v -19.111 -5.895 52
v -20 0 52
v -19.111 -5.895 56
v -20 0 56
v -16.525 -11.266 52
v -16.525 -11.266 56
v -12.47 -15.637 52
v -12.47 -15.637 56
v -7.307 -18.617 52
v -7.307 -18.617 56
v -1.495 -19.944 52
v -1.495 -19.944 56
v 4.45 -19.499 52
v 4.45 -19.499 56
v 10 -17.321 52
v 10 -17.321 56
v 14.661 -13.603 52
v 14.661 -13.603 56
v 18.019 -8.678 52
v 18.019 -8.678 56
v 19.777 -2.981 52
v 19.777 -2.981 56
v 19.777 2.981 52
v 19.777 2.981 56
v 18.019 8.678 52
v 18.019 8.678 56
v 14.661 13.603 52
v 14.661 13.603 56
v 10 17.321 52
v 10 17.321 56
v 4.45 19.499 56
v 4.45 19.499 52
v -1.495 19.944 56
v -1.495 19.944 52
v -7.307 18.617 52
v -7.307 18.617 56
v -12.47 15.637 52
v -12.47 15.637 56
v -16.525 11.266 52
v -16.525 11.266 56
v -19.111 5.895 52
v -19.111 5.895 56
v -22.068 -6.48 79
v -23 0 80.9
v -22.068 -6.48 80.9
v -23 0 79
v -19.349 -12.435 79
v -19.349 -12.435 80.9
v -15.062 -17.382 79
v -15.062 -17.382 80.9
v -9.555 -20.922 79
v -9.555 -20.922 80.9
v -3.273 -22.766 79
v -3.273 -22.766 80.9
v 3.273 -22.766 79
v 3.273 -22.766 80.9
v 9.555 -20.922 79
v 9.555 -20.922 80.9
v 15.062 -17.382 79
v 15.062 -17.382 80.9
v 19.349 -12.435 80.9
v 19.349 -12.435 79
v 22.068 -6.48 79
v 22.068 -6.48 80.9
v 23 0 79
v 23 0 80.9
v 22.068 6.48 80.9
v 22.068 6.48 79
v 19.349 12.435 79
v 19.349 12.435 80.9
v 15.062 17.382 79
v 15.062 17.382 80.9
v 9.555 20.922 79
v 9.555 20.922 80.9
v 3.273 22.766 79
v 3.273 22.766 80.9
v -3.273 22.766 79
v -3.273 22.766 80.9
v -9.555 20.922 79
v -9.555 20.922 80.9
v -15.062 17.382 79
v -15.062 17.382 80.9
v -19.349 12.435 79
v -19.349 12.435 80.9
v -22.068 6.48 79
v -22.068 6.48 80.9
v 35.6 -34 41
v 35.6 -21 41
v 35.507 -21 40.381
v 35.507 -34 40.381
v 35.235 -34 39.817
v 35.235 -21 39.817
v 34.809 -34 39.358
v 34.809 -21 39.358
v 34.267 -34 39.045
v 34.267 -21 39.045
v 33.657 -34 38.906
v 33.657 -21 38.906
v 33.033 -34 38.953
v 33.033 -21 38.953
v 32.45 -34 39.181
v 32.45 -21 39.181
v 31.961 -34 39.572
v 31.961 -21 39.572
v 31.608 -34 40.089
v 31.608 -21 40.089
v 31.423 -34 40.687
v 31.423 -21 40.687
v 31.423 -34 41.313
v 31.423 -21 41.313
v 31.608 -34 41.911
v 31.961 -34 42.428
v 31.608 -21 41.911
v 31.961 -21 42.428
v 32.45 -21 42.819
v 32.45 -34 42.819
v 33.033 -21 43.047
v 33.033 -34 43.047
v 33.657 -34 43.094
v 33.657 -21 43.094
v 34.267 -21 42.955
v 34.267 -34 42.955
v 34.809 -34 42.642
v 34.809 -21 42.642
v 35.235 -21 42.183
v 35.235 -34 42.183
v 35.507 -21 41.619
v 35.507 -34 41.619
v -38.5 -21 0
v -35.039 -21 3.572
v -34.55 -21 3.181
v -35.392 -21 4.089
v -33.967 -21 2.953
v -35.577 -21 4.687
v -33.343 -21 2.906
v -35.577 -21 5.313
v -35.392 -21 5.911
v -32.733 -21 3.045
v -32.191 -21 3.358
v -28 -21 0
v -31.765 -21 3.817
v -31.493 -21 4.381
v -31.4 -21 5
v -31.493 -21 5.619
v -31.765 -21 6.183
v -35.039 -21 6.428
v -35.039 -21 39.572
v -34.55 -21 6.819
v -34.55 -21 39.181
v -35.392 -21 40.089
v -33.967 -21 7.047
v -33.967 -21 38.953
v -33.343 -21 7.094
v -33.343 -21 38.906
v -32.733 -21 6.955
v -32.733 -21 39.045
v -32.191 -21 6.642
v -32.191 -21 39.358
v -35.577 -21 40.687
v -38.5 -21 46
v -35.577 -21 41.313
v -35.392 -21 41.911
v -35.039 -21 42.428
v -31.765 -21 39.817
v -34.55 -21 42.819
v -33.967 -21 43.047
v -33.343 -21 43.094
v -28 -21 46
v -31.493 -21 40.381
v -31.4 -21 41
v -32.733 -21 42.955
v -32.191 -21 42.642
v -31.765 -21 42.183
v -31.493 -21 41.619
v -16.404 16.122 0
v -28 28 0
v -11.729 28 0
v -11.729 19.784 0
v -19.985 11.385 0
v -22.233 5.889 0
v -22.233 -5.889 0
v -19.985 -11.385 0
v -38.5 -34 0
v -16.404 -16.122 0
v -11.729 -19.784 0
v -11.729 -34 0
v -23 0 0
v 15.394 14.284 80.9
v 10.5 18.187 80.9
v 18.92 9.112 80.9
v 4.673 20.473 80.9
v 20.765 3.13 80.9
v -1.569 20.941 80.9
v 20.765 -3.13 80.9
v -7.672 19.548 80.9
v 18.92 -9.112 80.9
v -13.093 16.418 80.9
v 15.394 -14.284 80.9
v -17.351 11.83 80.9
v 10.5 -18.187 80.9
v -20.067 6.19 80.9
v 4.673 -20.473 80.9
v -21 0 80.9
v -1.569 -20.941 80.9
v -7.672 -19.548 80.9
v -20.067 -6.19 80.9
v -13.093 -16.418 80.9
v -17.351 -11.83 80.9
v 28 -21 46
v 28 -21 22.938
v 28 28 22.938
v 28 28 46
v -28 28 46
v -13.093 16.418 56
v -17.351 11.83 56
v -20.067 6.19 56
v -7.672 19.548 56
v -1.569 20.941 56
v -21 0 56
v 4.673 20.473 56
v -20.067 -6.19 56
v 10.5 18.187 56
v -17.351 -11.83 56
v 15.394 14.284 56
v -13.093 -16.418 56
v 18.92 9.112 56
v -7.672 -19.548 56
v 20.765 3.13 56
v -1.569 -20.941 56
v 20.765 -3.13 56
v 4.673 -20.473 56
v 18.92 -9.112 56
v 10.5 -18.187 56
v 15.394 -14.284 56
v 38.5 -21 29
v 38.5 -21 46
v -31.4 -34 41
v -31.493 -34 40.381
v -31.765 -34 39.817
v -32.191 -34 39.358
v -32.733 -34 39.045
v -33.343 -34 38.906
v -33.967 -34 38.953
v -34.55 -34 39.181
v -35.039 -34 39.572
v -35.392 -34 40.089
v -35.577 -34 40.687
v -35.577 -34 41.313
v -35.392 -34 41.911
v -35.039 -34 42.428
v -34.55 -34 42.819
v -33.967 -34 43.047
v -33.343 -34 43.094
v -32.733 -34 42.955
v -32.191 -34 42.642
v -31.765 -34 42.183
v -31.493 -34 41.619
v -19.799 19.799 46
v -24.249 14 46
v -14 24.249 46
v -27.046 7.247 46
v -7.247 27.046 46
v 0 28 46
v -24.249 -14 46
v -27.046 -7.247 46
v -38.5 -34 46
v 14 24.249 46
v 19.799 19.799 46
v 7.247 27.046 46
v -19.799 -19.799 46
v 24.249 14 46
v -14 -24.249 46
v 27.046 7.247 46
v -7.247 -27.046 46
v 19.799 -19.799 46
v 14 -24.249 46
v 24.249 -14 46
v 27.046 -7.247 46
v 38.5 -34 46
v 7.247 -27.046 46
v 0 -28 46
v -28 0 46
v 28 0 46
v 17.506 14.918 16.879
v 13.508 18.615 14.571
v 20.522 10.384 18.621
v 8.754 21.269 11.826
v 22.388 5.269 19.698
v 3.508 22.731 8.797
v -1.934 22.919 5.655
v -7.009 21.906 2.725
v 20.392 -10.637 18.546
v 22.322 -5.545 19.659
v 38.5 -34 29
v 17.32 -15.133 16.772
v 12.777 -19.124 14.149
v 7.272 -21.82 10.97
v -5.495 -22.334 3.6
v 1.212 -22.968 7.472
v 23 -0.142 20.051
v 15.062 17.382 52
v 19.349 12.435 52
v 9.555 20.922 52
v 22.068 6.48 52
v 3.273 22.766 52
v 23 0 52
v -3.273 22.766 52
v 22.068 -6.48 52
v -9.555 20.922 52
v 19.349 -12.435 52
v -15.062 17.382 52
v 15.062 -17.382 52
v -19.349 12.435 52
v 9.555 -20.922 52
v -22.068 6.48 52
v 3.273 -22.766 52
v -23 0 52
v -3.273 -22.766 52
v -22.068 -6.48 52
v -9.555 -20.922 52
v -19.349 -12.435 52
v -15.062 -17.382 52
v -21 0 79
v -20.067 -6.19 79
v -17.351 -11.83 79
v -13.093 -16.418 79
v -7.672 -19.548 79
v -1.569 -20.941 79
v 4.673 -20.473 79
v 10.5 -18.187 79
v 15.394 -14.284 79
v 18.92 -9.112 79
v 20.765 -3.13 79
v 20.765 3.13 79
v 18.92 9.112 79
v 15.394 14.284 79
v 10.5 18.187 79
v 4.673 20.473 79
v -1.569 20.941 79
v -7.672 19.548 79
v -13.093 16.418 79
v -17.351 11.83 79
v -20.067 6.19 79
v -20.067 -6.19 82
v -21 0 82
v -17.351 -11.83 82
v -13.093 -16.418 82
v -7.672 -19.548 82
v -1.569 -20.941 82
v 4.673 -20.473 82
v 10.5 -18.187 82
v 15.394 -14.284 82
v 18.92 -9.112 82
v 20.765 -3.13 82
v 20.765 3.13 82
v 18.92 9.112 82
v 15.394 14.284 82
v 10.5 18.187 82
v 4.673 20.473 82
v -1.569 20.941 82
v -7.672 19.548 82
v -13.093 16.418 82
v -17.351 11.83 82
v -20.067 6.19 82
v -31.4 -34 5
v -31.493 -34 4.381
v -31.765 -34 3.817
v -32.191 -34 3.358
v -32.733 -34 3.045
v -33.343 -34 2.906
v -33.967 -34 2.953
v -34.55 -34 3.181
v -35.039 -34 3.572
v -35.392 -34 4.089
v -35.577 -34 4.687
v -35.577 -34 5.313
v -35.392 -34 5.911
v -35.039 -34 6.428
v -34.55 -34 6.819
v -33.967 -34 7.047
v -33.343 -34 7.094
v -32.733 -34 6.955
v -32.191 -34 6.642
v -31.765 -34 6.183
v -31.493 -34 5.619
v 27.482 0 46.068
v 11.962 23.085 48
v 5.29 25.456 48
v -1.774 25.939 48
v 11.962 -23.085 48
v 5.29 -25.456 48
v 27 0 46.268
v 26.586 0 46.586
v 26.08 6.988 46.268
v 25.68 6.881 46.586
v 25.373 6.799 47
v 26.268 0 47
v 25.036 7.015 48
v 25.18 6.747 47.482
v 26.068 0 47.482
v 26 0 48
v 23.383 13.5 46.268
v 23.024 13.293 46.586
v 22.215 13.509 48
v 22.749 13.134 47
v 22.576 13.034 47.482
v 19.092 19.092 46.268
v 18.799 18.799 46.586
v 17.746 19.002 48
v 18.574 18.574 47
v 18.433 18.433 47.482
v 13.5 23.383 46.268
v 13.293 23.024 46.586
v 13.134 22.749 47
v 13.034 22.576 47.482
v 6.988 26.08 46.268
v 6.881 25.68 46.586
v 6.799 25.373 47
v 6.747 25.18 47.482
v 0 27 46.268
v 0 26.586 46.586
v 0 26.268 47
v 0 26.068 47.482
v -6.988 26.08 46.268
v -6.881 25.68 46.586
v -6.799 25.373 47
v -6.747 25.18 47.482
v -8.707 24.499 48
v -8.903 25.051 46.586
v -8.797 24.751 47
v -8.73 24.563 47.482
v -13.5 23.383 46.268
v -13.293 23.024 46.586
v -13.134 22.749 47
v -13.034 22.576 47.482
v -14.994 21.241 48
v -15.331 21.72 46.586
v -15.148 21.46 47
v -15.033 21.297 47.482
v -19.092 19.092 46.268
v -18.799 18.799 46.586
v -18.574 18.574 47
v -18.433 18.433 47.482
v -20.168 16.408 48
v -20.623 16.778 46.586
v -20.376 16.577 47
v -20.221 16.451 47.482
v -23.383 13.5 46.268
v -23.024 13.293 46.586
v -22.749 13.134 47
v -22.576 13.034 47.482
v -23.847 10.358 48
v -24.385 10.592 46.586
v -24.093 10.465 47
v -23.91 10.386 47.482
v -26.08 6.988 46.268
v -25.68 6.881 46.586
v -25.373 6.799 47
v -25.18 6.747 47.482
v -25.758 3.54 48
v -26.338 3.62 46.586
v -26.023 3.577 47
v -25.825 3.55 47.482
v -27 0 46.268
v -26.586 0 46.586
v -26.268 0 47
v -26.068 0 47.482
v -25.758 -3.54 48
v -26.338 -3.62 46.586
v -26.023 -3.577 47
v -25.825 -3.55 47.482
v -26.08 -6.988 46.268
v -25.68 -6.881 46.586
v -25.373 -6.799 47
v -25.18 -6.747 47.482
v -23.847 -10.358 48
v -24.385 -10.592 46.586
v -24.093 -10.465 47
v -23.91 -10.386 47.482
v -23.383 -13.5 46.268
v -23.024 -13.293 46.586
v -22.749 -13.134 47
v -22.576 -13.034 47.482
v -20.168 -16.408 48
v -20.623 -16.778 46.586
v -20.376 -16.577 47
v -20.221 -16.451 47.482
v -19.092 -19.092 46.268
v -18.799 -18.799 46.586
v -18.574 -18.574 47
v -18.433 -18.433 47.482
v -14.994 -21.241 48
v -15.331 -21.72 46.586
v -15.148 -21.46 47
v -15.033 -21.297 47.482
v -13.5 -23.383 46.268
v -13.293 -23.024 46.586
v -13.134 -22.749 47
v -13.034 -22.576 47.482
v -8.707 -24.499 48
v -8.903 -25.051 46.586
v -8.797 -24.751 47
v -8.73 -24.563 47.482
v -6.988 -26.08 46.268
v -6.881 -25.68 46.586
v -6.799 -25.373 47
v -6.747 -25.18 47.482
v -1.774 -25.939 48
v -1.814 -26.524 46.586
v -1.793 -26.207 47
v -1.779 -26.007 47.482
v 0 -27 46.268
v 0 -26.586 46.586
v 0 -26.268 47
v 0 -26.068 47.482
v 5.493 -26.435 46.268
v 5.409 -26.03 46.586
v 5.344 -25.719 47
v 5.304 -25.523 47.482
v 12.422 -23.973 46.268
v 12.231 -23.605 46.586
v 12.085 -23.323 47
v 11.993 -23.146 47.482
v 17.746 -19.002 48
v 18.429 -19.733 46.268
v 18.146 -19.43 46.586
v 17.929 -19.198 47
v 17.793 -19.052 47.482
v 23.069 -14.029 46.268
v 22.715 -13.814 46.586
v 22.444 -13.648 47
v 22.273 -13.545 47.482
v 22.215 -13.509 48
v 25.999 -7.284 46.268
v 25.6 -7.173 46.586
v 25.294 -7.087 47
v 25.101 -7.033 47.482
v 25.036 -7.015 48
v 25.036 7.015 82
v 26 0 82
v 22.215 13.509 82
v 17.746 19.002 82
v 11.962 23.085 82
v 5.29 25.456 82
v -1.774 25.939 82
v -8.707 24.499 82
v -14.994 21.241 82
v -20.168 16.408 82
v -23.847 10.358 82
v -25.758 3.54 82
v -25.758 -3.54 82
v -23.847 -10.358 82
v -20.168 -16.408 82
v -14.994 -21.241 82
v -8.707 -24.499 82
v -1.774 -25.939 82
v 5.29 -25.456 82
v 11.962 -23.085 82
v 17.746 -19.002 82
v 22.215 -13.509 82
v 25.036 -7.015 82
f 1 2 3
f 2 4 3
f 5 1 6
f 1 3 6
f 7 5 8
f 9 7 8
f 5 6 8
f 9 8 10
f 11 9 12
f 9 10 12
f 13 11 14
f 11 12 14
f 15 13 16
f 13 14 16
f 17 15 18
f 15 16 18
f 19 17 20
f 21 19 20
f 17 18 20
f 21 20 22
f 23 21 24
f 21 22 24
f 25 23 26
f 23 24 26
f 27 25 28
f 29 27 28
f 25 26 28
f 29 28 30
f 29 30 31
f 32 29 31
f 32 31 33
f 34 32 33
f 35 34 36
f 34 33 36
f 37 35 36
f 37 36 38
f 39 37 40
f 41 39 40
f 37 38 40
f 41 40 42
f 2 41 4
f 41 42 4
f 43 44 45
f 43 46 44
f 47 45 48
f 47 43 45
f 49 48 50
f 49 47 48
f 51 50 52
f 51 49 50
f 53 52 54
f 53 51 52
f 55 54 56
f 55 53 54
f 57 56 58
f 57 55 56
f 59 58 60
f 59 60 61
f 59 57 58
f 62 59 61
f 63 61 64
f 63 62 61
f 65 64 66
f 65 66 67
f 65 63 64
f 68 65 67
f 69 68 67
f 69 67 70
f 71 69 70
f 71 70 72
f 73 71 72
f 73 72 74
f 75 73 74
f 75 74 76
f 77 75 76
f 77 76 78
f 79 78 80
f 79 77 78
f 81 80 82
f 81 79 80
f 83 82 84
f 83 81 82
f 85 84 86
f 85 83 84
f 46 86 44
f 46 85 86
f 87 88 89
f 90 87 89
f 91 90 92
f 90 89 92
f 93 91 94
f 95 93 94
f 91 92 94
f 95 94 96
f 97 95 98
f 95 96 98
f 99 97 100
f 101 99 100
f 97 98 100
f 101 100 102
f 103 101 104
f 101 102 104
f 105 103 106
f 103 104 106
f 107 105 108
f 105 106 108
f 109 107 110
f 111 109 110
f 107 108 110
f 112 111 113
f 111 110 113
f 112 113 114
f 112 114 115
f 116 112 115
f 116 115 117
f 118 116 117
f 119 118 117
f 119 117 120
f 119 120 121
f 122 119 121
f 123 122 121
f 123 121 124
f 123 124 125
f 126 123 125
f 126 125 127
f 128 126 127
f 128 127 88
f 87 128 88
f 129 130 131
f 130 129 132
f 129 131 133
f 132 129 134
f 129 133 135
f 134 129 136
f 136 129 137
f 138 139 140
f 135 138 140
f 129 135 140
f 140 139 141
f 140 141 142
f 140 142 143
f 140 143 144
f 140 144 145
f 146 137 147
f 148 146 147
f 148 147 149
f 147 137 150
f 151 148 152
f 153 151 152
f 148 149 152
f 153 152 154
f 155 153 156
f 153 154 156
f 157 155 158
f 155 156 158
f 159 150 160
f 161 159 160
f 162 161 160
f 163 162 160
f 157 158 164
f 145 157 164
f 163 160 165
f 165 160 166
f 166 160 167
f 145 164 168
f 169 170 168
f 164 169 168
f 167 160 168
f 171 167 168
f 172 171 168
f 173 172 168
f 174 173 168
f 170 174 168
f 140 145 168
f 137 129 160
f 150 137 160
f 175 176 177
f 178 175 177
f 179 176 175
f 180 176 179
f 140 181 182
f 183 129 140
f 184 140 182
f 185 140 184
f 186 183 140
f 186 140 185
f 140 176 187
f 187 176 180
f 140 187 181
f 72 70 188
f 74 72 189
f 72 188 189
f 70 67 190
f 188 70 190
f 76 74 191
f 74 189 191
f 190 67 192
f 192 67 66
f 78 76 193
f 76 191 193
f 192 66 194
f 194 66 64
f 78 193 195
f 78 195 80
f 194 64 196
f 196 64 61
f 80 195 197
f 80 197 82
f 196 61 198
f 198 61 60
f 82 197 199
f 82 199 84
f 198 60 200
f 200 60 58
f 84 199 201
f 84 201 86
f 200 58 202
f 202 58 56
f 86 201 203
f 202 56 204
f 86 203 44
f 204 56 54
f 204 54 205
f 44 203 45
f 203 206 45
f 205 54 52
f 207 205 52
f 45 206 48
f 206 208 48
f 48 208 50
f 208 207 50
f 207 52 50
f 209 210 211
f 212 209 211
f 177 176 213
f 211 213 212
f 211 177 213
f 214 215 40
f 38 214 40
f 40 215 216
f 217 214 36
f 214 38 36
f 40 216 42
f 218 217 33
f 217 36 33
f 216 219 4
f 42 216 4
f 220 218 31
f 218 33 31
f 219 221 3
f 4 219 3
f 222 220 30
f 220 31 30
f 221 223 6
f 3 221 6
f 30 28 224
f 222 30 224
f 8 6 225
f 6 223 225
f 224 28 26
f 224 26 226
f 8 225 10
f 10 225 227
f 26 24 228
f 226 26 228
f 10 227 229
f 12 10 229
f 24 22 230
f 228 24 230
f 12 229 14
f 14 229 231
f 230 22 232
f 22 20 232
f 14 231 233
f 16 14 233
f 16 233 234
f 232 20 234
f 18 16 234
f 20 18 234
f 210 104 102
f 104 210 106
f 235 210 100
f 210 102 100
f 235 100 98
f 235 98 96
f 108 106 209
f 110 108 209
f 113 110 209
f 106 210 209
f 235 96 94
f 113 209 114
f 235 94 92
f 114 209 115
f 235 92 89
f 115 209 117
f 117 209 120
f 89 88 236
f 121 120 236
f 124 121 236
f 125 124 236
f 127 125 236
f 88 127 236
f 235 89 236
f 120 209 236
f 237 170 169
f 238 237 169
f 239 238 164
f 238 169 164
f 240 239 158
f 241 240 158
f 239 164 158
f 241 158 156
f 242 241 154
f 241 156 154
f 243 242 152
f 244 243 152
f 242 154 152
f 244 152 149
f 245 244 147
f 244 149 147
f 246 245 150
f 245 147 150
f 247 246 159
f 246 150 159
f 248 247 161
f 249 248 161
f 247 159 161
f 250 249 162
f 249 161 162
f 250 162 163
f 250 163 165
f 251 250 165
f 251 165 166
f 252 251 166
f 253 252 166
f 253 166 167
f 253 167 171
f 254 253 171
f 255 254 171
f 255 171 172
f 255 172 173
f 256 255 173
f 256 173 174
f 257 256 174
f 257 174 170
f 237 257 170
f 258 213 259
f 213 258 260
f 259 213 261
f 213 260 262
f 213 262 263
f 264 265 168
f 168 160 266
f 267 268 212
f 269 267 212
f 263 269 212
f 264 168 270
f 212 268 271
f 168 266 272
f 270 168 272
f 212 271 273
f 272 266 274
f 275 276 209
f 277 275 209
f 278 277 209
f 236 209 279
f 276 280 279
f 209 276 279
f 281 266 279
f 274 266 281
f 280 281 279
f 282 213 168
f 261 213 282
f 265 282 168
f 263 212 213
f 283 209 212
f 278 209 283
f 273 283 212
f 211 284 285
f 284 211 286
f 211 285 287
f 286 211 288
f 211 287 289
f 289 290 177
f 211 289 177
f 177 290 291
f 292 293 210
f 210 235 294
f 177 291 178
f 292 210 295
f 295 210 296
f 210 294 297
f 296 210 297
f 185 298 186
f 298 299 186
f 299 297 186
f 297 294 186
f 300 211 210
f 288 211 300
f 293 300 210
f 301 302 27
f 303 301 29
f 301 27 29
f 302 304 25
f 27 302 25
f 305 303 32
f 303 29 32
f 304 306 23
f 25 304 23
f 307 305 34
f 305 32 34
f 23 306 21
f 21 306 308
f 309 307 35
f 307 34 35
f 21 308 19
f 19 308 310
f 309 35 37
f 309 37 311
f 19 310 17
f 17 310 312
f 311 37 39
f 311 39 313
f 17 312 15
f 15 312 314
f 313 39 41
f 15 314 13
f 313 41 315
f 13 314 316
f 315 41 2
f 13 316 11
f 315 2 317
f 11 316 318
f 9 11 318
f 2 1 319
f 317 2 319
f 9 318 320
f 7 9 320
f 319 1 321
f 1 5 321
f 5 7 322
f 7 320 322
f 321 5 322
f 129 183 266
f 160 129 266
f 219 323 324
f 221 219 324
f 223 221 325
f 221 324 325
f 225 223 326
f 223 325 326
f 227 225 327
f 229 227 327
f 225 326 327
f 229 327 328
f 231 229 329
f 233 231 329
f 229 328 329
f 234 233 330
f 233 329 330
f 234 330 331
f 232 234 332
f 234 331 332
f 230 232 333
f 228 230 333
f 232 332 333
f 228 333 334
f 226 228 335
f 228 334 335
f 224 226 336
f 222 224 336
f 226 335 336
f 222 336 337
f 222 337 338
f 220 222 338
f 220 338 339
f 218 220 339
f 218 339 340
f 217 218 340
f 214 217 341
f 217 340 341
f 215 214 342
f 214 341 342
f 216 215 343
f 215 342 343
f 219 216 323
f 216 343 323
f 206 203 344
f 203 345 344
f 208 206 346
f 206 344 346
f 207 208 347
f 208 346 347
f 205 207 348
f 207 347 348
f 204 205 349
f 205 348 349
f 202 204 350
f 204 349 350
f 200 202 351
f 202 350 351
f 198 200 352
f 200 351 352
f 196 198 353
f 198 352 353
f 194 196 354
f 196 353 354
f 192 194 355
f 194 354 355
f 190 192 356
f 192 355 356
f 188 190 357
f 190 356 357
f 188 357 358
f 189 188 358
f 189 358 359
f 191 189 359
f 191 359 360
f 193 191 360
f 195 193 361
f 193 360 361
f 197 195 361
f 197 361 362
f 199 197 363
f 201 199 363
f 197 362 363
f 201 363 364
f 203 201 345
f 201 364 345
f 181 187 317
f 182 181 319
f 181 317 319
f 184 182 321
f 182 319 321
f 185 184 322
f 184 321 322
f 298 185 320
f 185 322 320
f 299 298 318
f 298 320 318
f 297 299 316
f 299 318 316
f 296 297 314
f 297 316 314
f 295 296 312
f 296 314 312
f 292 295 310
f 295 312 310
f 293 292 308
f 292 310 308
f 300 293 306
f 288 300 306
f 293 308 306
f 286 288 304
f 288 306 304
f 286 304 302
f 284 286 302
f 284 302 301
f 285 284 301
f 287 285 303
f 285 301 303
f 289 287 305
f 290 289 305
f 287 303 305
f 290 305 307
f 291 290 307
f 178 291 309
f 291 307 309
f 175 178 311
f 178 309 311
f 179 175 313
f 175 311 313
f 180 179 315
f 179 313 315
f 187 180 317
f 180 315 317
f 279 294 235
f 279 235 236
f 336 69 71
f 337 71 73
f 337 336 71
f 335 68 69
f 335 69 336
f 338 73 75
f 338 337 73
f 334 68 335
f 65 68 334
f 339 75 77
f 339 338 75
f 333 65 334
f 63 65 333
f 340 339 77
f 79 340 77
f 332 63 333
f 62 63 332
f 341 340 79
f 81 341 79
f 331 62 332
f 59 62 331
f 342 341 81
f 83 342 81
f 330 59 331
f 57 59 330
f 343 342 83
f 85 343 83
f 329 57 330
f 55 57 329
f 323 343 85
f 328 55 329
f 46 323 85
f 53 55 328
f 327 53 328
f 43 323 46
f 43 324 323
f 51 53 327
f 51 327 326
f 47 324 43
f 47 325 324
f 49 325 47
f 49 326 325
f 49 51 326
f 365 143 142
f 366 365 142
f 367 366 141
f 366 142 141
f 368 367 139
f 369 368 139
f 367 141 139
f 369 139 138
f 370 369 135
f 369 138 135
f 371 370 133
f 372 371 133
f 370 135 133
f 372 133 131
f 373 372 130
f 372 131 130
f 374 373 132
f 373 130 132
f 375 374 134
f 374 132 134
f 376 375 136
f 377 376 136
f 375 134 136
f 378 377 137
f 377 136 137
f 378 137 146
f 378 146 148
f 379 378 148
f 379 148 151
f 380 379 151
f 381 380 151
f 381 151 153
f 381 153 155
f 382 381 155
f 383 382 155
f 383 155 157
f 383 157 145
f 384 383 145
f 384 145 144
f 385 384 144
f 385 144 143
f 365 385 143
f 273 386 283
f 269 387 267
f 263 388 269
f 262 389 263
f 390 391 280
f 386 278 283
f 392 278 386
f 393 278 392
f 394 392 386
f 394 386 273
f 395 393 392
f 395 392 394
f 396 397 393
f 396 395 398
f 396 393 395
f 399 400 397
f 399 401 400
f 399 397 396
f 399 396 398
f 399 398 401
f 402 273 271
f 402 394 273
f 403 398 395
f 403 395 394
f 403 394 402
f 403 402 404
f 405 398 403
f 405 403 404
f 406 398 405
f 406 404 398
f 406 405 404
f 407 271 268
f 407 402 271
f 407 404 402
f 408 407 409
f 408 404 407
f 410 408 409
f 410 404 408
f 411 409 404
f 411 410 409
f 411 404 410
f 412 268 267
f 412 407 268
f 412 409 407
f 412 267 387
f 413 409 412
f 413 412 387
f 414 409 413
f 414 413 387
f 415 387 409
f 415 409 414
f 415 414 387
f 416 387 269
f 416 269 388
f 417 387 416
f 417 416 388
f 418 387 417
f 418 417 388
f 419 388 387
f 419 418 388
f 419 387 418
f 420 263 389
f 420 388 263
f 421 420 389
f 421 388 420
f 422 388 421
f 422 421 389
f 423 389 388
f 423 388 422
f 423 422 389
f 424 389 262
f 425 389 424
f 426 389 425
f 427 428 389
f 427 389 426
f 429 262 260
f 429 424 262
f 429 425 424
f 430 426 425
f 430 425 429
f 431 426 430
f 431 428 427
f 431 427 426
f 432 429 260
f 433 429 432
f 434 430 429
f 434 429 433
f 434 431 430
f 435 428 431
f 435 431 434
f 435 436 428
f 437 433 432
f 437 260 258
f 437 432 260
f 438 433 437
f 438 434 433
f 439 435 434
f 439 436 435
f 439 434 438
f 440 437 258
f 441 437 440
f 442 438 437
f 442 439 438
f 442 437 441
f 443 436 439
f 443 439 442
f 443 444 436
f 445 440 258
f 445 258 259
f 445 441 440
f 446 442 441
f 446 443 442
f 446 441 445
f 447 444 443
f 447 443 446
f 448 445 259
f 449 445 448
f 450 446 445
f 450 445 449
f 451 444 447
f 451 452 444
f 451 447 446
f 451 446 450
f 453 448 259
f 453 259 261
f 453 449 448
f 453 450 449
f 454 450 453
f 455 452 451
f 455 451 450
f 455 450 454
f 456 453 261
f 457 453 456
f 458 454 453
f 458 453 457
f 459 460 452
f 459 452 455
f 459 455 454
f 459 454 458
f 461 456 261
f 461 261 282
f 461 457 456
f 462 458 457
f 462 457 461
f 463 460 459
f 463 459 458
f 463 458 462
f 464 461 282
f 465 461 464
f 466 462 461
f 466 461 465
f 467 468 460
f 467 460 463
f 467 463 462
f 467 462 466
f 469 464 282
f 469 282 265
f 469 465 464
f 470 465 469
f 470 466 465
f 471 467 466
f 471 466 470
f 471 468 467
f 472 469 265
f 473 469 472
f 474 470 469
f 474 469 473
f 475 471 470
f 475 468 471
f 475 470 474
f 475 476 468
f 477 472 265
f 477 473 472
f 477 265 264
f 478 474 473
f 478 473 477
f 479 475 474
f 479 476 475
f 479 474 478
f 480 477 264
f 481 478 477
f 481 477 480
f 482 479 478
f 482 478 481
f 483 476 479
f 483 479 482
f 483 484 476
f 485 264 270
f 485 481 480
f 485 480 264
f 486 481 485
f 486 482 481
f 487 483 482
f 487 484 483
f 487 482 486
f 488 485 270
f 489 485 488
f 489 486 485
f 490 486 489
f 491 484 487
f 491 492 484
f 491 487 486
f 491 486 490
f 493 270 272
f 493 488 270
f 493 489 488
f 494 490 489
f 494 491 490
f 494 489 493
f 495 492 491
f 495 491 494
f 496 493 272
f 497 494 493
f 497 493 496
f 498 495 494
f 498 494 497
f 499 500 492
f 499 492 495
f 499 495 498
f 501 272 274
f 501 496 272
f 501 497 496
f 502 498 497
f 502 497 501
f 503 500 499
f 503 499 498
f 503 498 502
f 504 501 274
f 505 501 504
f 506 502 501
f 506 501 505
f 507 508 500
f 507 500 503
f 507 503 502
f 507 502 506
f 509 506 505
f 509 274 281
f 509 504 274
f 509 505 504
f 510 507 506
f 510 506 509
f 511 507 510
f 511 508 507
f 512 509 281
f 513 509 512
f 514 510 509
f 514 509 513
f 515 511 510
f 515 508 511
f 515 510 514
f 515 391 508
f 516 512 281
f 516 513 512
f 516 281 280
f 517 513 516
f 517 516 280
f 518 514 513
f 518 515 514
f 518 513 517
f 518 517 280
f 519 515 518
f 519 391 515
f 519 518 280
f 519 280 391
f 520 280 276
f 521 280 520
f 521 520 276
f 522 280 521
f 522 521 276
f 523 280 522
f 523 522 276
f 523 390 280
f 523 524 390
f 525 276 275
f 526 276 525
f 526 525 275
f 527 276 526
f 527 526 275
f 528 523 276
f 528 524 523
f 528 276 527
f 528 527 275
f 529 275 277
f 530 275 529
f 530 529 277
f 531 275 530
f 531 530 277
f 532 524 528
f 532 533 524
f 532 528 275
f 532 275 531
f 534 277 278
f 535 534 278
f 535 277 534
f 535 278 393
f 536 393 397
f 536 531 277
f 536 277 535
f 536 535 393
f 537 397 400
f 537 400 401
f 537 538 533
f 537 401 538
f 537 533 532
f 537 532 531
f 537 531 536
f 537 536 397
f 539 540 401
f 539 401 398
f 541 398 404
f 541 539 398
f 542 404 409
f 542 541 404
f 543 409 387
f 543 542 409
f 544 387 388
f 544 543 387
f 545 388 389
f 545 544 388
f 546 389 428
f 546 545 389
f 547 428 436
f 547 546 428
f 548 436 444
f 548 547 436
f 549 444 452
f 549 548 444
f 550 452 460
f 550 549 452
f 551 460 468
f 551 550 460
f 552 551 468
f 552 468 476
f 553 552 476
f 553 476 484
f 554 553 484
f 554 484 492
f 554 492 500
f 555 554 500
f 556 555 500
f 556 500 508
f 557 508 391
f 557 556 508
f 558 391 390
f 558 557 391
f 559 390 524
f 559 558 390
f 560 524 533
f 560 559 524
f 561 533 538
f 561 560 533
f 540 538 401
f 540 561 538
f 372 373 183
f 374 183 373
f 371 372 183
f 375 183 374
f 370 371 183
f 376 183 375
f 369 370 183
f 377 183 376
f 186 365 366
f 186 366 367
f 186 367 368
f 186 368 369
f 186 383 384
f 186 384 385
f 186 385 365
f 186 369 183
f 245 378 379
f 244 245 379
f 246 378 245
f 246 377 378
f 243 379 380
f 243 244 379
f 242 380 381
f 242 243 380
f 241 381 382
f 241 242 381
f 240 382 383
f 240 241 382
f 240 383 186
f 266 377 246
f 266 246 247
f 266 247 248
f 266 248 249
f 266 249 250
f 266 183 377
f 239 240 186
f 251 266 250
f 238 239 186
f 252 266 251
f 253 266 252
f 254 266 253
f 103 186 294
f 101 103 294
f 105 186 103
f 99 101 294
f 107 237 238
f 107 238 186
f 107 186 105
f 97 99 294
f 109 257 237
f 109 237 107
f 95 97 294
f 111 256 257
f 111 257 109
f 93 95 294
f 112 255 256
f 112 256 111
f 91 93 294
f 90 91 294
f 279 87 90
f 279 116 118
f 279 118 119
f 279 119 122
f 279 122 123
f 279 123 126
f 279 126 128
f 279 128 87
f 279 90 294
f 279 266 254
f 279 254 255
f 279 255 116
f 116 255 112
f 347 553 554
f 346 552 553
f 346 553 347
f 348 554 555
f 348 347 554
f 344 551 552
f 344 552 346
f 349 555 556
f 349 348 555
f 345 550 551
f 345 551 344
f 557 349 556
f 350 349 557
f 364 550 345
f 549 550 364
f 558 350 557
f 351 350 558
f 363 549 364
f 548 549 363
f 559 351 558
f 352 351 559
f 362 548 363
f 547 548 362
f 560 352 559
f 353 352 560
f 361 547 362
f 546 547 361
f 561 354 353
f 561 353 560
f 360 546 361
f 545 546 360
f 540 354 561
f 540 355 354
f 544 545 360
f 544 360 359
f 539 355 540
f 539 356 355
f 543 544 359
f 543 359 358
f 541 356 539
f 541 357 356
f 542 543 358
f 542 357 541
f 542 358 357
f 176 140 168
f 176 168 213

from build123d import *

# Parameters (mm, degrees)
SKETCH_1_W          = 56
SKETCH_1_H          = 62
EXTRUDE_1_DEPTH     = 82
SKETCH_4_W          = 56
SKETCH_4_H          = 62
SKETCH_4_R          = 26
CUT_EXTRUDE_1_DEPTH = 36
SKETCH_15_W         = 23
SKETCH_15_H         = 1.9
FILLET_1_R          = 2
SKETCH_19_W         = 10.5
SKETCH_19_H         = 46
EXTRUDE_2_DEPTH     = 13
CUT_EXTRUDE_2_DEPTH = 110.773630713
HOLE_WIZARD_M5_1_D  = 4.2


with BuildPart() as part:
    # 草图1 → 凸台-拉伸1 (new body)
    with BuildSketch(Plane.XY):
        with Locations((0, -3)):
            Rectangle(SKETCH_1_W, SKETCH_1_H)
    extrude(amount=EXTRUDE_1_DEPTH)

    # 草图3 → 切除-旋转2 (revolve, cut)
    with BuildSketch(Plane(origin=(0, 0, 0), x_dir=(0, 0, -1), z_dir=(1, 0, 0)), mode=Mode.PRIVATE) as cut_revolve_2_sk:
        Polygon((-82, 0), (0, 0), (0, 23), (-52, 23), (-52, 20), (-56, 20), (-56, 21), (-82, 21), align=None)
    revolve(cut_revolve_2_sk.sketch.rotate(Axis((0, 0, -5.719261836), (0, 0, 1)), 90), axis=Axis((0, 0, -5.719261836), (0, 0, 1)), mode=Mode.SUBTRACT)

    # 草图4 → 切除-拉伸1 (cut)
    with BuildSketch(Plane.XY.offset(82)):
        with Locations((0, -3)):
            Rectangle(SKETCH_4_W, SKETCH_4_H)
        Circle(SKETCH_4_R, mode=Mode.SUBTRACT)
    extrude(amount=-CUT_EXTRUDE_1_DEPTH, mode=Mode.SUBTRACT)

    # 草图15 → 切除-旋转3 (revolve, cut)
    with BuildSketch(Plane(origin=(0, 0, 0), x_dir=(1, 0, 0), z_dir=(0, 1, 0))):
        with Locations((-11.5, -79.95)):
            Rectangle(SKETCH_15_W, SKETCH_15_H)
    revolve(axis=Axis((0, 0, 0), (0, 0, 1)), mode=Mode.SUBTRACT)

    # 圆角1
    fillet_1_edges = [part.edges().sort_by_distance(p)[0] for p in [
        (-26, 0, 46),
    ]]
    fillet(fillet_1_edges, radius=FILLET_1_R - 0.0001)  # a hair under: the kernel refuses the full size

    # 草图19 → 凸台-拉伸2 (add)
    with BuildSketch(Plane.XZ.offset(34)):
        with Locations((33.25, 23)):
            Rectangle(SKETCH_19_W, SKETCH_19_H)
        with Locations((-33.25, 23)):
            Rectangle(SKETCH_19_W, SKETCH_19_H)
    extrude(amount=-EXTRUDE_2_DEPTH)

    # 草图25 → 切除-拉伸2 (cut, through all)
    with BuildSketch(Plane.XZ.offset(34)):
        Polygon((213.716550827, 130.161322786), (38.5, 29), (-11.729473419, 0), (-186.946024246, -101.161322786), (15.376621326, -451.59442444), (416.039196399, -220.271778867), align=None)
    extrude(amount=-CUT_EXTRUDE_2_DEPTH, mode=Mode.SUBTRACT)

    # M5 螺纹孔1 (through all)
    with Locations(Plane(origin=(0, -34, 0), x_dir=(-1, 0, 0), z_dir=(0, -1, 0))):
        with Locations((33.5, -5), (-33.5, -41), (33.5, -41)):
            Hole(HOLE_WIZARD_M5_1_D / 2)


solid = part.part
